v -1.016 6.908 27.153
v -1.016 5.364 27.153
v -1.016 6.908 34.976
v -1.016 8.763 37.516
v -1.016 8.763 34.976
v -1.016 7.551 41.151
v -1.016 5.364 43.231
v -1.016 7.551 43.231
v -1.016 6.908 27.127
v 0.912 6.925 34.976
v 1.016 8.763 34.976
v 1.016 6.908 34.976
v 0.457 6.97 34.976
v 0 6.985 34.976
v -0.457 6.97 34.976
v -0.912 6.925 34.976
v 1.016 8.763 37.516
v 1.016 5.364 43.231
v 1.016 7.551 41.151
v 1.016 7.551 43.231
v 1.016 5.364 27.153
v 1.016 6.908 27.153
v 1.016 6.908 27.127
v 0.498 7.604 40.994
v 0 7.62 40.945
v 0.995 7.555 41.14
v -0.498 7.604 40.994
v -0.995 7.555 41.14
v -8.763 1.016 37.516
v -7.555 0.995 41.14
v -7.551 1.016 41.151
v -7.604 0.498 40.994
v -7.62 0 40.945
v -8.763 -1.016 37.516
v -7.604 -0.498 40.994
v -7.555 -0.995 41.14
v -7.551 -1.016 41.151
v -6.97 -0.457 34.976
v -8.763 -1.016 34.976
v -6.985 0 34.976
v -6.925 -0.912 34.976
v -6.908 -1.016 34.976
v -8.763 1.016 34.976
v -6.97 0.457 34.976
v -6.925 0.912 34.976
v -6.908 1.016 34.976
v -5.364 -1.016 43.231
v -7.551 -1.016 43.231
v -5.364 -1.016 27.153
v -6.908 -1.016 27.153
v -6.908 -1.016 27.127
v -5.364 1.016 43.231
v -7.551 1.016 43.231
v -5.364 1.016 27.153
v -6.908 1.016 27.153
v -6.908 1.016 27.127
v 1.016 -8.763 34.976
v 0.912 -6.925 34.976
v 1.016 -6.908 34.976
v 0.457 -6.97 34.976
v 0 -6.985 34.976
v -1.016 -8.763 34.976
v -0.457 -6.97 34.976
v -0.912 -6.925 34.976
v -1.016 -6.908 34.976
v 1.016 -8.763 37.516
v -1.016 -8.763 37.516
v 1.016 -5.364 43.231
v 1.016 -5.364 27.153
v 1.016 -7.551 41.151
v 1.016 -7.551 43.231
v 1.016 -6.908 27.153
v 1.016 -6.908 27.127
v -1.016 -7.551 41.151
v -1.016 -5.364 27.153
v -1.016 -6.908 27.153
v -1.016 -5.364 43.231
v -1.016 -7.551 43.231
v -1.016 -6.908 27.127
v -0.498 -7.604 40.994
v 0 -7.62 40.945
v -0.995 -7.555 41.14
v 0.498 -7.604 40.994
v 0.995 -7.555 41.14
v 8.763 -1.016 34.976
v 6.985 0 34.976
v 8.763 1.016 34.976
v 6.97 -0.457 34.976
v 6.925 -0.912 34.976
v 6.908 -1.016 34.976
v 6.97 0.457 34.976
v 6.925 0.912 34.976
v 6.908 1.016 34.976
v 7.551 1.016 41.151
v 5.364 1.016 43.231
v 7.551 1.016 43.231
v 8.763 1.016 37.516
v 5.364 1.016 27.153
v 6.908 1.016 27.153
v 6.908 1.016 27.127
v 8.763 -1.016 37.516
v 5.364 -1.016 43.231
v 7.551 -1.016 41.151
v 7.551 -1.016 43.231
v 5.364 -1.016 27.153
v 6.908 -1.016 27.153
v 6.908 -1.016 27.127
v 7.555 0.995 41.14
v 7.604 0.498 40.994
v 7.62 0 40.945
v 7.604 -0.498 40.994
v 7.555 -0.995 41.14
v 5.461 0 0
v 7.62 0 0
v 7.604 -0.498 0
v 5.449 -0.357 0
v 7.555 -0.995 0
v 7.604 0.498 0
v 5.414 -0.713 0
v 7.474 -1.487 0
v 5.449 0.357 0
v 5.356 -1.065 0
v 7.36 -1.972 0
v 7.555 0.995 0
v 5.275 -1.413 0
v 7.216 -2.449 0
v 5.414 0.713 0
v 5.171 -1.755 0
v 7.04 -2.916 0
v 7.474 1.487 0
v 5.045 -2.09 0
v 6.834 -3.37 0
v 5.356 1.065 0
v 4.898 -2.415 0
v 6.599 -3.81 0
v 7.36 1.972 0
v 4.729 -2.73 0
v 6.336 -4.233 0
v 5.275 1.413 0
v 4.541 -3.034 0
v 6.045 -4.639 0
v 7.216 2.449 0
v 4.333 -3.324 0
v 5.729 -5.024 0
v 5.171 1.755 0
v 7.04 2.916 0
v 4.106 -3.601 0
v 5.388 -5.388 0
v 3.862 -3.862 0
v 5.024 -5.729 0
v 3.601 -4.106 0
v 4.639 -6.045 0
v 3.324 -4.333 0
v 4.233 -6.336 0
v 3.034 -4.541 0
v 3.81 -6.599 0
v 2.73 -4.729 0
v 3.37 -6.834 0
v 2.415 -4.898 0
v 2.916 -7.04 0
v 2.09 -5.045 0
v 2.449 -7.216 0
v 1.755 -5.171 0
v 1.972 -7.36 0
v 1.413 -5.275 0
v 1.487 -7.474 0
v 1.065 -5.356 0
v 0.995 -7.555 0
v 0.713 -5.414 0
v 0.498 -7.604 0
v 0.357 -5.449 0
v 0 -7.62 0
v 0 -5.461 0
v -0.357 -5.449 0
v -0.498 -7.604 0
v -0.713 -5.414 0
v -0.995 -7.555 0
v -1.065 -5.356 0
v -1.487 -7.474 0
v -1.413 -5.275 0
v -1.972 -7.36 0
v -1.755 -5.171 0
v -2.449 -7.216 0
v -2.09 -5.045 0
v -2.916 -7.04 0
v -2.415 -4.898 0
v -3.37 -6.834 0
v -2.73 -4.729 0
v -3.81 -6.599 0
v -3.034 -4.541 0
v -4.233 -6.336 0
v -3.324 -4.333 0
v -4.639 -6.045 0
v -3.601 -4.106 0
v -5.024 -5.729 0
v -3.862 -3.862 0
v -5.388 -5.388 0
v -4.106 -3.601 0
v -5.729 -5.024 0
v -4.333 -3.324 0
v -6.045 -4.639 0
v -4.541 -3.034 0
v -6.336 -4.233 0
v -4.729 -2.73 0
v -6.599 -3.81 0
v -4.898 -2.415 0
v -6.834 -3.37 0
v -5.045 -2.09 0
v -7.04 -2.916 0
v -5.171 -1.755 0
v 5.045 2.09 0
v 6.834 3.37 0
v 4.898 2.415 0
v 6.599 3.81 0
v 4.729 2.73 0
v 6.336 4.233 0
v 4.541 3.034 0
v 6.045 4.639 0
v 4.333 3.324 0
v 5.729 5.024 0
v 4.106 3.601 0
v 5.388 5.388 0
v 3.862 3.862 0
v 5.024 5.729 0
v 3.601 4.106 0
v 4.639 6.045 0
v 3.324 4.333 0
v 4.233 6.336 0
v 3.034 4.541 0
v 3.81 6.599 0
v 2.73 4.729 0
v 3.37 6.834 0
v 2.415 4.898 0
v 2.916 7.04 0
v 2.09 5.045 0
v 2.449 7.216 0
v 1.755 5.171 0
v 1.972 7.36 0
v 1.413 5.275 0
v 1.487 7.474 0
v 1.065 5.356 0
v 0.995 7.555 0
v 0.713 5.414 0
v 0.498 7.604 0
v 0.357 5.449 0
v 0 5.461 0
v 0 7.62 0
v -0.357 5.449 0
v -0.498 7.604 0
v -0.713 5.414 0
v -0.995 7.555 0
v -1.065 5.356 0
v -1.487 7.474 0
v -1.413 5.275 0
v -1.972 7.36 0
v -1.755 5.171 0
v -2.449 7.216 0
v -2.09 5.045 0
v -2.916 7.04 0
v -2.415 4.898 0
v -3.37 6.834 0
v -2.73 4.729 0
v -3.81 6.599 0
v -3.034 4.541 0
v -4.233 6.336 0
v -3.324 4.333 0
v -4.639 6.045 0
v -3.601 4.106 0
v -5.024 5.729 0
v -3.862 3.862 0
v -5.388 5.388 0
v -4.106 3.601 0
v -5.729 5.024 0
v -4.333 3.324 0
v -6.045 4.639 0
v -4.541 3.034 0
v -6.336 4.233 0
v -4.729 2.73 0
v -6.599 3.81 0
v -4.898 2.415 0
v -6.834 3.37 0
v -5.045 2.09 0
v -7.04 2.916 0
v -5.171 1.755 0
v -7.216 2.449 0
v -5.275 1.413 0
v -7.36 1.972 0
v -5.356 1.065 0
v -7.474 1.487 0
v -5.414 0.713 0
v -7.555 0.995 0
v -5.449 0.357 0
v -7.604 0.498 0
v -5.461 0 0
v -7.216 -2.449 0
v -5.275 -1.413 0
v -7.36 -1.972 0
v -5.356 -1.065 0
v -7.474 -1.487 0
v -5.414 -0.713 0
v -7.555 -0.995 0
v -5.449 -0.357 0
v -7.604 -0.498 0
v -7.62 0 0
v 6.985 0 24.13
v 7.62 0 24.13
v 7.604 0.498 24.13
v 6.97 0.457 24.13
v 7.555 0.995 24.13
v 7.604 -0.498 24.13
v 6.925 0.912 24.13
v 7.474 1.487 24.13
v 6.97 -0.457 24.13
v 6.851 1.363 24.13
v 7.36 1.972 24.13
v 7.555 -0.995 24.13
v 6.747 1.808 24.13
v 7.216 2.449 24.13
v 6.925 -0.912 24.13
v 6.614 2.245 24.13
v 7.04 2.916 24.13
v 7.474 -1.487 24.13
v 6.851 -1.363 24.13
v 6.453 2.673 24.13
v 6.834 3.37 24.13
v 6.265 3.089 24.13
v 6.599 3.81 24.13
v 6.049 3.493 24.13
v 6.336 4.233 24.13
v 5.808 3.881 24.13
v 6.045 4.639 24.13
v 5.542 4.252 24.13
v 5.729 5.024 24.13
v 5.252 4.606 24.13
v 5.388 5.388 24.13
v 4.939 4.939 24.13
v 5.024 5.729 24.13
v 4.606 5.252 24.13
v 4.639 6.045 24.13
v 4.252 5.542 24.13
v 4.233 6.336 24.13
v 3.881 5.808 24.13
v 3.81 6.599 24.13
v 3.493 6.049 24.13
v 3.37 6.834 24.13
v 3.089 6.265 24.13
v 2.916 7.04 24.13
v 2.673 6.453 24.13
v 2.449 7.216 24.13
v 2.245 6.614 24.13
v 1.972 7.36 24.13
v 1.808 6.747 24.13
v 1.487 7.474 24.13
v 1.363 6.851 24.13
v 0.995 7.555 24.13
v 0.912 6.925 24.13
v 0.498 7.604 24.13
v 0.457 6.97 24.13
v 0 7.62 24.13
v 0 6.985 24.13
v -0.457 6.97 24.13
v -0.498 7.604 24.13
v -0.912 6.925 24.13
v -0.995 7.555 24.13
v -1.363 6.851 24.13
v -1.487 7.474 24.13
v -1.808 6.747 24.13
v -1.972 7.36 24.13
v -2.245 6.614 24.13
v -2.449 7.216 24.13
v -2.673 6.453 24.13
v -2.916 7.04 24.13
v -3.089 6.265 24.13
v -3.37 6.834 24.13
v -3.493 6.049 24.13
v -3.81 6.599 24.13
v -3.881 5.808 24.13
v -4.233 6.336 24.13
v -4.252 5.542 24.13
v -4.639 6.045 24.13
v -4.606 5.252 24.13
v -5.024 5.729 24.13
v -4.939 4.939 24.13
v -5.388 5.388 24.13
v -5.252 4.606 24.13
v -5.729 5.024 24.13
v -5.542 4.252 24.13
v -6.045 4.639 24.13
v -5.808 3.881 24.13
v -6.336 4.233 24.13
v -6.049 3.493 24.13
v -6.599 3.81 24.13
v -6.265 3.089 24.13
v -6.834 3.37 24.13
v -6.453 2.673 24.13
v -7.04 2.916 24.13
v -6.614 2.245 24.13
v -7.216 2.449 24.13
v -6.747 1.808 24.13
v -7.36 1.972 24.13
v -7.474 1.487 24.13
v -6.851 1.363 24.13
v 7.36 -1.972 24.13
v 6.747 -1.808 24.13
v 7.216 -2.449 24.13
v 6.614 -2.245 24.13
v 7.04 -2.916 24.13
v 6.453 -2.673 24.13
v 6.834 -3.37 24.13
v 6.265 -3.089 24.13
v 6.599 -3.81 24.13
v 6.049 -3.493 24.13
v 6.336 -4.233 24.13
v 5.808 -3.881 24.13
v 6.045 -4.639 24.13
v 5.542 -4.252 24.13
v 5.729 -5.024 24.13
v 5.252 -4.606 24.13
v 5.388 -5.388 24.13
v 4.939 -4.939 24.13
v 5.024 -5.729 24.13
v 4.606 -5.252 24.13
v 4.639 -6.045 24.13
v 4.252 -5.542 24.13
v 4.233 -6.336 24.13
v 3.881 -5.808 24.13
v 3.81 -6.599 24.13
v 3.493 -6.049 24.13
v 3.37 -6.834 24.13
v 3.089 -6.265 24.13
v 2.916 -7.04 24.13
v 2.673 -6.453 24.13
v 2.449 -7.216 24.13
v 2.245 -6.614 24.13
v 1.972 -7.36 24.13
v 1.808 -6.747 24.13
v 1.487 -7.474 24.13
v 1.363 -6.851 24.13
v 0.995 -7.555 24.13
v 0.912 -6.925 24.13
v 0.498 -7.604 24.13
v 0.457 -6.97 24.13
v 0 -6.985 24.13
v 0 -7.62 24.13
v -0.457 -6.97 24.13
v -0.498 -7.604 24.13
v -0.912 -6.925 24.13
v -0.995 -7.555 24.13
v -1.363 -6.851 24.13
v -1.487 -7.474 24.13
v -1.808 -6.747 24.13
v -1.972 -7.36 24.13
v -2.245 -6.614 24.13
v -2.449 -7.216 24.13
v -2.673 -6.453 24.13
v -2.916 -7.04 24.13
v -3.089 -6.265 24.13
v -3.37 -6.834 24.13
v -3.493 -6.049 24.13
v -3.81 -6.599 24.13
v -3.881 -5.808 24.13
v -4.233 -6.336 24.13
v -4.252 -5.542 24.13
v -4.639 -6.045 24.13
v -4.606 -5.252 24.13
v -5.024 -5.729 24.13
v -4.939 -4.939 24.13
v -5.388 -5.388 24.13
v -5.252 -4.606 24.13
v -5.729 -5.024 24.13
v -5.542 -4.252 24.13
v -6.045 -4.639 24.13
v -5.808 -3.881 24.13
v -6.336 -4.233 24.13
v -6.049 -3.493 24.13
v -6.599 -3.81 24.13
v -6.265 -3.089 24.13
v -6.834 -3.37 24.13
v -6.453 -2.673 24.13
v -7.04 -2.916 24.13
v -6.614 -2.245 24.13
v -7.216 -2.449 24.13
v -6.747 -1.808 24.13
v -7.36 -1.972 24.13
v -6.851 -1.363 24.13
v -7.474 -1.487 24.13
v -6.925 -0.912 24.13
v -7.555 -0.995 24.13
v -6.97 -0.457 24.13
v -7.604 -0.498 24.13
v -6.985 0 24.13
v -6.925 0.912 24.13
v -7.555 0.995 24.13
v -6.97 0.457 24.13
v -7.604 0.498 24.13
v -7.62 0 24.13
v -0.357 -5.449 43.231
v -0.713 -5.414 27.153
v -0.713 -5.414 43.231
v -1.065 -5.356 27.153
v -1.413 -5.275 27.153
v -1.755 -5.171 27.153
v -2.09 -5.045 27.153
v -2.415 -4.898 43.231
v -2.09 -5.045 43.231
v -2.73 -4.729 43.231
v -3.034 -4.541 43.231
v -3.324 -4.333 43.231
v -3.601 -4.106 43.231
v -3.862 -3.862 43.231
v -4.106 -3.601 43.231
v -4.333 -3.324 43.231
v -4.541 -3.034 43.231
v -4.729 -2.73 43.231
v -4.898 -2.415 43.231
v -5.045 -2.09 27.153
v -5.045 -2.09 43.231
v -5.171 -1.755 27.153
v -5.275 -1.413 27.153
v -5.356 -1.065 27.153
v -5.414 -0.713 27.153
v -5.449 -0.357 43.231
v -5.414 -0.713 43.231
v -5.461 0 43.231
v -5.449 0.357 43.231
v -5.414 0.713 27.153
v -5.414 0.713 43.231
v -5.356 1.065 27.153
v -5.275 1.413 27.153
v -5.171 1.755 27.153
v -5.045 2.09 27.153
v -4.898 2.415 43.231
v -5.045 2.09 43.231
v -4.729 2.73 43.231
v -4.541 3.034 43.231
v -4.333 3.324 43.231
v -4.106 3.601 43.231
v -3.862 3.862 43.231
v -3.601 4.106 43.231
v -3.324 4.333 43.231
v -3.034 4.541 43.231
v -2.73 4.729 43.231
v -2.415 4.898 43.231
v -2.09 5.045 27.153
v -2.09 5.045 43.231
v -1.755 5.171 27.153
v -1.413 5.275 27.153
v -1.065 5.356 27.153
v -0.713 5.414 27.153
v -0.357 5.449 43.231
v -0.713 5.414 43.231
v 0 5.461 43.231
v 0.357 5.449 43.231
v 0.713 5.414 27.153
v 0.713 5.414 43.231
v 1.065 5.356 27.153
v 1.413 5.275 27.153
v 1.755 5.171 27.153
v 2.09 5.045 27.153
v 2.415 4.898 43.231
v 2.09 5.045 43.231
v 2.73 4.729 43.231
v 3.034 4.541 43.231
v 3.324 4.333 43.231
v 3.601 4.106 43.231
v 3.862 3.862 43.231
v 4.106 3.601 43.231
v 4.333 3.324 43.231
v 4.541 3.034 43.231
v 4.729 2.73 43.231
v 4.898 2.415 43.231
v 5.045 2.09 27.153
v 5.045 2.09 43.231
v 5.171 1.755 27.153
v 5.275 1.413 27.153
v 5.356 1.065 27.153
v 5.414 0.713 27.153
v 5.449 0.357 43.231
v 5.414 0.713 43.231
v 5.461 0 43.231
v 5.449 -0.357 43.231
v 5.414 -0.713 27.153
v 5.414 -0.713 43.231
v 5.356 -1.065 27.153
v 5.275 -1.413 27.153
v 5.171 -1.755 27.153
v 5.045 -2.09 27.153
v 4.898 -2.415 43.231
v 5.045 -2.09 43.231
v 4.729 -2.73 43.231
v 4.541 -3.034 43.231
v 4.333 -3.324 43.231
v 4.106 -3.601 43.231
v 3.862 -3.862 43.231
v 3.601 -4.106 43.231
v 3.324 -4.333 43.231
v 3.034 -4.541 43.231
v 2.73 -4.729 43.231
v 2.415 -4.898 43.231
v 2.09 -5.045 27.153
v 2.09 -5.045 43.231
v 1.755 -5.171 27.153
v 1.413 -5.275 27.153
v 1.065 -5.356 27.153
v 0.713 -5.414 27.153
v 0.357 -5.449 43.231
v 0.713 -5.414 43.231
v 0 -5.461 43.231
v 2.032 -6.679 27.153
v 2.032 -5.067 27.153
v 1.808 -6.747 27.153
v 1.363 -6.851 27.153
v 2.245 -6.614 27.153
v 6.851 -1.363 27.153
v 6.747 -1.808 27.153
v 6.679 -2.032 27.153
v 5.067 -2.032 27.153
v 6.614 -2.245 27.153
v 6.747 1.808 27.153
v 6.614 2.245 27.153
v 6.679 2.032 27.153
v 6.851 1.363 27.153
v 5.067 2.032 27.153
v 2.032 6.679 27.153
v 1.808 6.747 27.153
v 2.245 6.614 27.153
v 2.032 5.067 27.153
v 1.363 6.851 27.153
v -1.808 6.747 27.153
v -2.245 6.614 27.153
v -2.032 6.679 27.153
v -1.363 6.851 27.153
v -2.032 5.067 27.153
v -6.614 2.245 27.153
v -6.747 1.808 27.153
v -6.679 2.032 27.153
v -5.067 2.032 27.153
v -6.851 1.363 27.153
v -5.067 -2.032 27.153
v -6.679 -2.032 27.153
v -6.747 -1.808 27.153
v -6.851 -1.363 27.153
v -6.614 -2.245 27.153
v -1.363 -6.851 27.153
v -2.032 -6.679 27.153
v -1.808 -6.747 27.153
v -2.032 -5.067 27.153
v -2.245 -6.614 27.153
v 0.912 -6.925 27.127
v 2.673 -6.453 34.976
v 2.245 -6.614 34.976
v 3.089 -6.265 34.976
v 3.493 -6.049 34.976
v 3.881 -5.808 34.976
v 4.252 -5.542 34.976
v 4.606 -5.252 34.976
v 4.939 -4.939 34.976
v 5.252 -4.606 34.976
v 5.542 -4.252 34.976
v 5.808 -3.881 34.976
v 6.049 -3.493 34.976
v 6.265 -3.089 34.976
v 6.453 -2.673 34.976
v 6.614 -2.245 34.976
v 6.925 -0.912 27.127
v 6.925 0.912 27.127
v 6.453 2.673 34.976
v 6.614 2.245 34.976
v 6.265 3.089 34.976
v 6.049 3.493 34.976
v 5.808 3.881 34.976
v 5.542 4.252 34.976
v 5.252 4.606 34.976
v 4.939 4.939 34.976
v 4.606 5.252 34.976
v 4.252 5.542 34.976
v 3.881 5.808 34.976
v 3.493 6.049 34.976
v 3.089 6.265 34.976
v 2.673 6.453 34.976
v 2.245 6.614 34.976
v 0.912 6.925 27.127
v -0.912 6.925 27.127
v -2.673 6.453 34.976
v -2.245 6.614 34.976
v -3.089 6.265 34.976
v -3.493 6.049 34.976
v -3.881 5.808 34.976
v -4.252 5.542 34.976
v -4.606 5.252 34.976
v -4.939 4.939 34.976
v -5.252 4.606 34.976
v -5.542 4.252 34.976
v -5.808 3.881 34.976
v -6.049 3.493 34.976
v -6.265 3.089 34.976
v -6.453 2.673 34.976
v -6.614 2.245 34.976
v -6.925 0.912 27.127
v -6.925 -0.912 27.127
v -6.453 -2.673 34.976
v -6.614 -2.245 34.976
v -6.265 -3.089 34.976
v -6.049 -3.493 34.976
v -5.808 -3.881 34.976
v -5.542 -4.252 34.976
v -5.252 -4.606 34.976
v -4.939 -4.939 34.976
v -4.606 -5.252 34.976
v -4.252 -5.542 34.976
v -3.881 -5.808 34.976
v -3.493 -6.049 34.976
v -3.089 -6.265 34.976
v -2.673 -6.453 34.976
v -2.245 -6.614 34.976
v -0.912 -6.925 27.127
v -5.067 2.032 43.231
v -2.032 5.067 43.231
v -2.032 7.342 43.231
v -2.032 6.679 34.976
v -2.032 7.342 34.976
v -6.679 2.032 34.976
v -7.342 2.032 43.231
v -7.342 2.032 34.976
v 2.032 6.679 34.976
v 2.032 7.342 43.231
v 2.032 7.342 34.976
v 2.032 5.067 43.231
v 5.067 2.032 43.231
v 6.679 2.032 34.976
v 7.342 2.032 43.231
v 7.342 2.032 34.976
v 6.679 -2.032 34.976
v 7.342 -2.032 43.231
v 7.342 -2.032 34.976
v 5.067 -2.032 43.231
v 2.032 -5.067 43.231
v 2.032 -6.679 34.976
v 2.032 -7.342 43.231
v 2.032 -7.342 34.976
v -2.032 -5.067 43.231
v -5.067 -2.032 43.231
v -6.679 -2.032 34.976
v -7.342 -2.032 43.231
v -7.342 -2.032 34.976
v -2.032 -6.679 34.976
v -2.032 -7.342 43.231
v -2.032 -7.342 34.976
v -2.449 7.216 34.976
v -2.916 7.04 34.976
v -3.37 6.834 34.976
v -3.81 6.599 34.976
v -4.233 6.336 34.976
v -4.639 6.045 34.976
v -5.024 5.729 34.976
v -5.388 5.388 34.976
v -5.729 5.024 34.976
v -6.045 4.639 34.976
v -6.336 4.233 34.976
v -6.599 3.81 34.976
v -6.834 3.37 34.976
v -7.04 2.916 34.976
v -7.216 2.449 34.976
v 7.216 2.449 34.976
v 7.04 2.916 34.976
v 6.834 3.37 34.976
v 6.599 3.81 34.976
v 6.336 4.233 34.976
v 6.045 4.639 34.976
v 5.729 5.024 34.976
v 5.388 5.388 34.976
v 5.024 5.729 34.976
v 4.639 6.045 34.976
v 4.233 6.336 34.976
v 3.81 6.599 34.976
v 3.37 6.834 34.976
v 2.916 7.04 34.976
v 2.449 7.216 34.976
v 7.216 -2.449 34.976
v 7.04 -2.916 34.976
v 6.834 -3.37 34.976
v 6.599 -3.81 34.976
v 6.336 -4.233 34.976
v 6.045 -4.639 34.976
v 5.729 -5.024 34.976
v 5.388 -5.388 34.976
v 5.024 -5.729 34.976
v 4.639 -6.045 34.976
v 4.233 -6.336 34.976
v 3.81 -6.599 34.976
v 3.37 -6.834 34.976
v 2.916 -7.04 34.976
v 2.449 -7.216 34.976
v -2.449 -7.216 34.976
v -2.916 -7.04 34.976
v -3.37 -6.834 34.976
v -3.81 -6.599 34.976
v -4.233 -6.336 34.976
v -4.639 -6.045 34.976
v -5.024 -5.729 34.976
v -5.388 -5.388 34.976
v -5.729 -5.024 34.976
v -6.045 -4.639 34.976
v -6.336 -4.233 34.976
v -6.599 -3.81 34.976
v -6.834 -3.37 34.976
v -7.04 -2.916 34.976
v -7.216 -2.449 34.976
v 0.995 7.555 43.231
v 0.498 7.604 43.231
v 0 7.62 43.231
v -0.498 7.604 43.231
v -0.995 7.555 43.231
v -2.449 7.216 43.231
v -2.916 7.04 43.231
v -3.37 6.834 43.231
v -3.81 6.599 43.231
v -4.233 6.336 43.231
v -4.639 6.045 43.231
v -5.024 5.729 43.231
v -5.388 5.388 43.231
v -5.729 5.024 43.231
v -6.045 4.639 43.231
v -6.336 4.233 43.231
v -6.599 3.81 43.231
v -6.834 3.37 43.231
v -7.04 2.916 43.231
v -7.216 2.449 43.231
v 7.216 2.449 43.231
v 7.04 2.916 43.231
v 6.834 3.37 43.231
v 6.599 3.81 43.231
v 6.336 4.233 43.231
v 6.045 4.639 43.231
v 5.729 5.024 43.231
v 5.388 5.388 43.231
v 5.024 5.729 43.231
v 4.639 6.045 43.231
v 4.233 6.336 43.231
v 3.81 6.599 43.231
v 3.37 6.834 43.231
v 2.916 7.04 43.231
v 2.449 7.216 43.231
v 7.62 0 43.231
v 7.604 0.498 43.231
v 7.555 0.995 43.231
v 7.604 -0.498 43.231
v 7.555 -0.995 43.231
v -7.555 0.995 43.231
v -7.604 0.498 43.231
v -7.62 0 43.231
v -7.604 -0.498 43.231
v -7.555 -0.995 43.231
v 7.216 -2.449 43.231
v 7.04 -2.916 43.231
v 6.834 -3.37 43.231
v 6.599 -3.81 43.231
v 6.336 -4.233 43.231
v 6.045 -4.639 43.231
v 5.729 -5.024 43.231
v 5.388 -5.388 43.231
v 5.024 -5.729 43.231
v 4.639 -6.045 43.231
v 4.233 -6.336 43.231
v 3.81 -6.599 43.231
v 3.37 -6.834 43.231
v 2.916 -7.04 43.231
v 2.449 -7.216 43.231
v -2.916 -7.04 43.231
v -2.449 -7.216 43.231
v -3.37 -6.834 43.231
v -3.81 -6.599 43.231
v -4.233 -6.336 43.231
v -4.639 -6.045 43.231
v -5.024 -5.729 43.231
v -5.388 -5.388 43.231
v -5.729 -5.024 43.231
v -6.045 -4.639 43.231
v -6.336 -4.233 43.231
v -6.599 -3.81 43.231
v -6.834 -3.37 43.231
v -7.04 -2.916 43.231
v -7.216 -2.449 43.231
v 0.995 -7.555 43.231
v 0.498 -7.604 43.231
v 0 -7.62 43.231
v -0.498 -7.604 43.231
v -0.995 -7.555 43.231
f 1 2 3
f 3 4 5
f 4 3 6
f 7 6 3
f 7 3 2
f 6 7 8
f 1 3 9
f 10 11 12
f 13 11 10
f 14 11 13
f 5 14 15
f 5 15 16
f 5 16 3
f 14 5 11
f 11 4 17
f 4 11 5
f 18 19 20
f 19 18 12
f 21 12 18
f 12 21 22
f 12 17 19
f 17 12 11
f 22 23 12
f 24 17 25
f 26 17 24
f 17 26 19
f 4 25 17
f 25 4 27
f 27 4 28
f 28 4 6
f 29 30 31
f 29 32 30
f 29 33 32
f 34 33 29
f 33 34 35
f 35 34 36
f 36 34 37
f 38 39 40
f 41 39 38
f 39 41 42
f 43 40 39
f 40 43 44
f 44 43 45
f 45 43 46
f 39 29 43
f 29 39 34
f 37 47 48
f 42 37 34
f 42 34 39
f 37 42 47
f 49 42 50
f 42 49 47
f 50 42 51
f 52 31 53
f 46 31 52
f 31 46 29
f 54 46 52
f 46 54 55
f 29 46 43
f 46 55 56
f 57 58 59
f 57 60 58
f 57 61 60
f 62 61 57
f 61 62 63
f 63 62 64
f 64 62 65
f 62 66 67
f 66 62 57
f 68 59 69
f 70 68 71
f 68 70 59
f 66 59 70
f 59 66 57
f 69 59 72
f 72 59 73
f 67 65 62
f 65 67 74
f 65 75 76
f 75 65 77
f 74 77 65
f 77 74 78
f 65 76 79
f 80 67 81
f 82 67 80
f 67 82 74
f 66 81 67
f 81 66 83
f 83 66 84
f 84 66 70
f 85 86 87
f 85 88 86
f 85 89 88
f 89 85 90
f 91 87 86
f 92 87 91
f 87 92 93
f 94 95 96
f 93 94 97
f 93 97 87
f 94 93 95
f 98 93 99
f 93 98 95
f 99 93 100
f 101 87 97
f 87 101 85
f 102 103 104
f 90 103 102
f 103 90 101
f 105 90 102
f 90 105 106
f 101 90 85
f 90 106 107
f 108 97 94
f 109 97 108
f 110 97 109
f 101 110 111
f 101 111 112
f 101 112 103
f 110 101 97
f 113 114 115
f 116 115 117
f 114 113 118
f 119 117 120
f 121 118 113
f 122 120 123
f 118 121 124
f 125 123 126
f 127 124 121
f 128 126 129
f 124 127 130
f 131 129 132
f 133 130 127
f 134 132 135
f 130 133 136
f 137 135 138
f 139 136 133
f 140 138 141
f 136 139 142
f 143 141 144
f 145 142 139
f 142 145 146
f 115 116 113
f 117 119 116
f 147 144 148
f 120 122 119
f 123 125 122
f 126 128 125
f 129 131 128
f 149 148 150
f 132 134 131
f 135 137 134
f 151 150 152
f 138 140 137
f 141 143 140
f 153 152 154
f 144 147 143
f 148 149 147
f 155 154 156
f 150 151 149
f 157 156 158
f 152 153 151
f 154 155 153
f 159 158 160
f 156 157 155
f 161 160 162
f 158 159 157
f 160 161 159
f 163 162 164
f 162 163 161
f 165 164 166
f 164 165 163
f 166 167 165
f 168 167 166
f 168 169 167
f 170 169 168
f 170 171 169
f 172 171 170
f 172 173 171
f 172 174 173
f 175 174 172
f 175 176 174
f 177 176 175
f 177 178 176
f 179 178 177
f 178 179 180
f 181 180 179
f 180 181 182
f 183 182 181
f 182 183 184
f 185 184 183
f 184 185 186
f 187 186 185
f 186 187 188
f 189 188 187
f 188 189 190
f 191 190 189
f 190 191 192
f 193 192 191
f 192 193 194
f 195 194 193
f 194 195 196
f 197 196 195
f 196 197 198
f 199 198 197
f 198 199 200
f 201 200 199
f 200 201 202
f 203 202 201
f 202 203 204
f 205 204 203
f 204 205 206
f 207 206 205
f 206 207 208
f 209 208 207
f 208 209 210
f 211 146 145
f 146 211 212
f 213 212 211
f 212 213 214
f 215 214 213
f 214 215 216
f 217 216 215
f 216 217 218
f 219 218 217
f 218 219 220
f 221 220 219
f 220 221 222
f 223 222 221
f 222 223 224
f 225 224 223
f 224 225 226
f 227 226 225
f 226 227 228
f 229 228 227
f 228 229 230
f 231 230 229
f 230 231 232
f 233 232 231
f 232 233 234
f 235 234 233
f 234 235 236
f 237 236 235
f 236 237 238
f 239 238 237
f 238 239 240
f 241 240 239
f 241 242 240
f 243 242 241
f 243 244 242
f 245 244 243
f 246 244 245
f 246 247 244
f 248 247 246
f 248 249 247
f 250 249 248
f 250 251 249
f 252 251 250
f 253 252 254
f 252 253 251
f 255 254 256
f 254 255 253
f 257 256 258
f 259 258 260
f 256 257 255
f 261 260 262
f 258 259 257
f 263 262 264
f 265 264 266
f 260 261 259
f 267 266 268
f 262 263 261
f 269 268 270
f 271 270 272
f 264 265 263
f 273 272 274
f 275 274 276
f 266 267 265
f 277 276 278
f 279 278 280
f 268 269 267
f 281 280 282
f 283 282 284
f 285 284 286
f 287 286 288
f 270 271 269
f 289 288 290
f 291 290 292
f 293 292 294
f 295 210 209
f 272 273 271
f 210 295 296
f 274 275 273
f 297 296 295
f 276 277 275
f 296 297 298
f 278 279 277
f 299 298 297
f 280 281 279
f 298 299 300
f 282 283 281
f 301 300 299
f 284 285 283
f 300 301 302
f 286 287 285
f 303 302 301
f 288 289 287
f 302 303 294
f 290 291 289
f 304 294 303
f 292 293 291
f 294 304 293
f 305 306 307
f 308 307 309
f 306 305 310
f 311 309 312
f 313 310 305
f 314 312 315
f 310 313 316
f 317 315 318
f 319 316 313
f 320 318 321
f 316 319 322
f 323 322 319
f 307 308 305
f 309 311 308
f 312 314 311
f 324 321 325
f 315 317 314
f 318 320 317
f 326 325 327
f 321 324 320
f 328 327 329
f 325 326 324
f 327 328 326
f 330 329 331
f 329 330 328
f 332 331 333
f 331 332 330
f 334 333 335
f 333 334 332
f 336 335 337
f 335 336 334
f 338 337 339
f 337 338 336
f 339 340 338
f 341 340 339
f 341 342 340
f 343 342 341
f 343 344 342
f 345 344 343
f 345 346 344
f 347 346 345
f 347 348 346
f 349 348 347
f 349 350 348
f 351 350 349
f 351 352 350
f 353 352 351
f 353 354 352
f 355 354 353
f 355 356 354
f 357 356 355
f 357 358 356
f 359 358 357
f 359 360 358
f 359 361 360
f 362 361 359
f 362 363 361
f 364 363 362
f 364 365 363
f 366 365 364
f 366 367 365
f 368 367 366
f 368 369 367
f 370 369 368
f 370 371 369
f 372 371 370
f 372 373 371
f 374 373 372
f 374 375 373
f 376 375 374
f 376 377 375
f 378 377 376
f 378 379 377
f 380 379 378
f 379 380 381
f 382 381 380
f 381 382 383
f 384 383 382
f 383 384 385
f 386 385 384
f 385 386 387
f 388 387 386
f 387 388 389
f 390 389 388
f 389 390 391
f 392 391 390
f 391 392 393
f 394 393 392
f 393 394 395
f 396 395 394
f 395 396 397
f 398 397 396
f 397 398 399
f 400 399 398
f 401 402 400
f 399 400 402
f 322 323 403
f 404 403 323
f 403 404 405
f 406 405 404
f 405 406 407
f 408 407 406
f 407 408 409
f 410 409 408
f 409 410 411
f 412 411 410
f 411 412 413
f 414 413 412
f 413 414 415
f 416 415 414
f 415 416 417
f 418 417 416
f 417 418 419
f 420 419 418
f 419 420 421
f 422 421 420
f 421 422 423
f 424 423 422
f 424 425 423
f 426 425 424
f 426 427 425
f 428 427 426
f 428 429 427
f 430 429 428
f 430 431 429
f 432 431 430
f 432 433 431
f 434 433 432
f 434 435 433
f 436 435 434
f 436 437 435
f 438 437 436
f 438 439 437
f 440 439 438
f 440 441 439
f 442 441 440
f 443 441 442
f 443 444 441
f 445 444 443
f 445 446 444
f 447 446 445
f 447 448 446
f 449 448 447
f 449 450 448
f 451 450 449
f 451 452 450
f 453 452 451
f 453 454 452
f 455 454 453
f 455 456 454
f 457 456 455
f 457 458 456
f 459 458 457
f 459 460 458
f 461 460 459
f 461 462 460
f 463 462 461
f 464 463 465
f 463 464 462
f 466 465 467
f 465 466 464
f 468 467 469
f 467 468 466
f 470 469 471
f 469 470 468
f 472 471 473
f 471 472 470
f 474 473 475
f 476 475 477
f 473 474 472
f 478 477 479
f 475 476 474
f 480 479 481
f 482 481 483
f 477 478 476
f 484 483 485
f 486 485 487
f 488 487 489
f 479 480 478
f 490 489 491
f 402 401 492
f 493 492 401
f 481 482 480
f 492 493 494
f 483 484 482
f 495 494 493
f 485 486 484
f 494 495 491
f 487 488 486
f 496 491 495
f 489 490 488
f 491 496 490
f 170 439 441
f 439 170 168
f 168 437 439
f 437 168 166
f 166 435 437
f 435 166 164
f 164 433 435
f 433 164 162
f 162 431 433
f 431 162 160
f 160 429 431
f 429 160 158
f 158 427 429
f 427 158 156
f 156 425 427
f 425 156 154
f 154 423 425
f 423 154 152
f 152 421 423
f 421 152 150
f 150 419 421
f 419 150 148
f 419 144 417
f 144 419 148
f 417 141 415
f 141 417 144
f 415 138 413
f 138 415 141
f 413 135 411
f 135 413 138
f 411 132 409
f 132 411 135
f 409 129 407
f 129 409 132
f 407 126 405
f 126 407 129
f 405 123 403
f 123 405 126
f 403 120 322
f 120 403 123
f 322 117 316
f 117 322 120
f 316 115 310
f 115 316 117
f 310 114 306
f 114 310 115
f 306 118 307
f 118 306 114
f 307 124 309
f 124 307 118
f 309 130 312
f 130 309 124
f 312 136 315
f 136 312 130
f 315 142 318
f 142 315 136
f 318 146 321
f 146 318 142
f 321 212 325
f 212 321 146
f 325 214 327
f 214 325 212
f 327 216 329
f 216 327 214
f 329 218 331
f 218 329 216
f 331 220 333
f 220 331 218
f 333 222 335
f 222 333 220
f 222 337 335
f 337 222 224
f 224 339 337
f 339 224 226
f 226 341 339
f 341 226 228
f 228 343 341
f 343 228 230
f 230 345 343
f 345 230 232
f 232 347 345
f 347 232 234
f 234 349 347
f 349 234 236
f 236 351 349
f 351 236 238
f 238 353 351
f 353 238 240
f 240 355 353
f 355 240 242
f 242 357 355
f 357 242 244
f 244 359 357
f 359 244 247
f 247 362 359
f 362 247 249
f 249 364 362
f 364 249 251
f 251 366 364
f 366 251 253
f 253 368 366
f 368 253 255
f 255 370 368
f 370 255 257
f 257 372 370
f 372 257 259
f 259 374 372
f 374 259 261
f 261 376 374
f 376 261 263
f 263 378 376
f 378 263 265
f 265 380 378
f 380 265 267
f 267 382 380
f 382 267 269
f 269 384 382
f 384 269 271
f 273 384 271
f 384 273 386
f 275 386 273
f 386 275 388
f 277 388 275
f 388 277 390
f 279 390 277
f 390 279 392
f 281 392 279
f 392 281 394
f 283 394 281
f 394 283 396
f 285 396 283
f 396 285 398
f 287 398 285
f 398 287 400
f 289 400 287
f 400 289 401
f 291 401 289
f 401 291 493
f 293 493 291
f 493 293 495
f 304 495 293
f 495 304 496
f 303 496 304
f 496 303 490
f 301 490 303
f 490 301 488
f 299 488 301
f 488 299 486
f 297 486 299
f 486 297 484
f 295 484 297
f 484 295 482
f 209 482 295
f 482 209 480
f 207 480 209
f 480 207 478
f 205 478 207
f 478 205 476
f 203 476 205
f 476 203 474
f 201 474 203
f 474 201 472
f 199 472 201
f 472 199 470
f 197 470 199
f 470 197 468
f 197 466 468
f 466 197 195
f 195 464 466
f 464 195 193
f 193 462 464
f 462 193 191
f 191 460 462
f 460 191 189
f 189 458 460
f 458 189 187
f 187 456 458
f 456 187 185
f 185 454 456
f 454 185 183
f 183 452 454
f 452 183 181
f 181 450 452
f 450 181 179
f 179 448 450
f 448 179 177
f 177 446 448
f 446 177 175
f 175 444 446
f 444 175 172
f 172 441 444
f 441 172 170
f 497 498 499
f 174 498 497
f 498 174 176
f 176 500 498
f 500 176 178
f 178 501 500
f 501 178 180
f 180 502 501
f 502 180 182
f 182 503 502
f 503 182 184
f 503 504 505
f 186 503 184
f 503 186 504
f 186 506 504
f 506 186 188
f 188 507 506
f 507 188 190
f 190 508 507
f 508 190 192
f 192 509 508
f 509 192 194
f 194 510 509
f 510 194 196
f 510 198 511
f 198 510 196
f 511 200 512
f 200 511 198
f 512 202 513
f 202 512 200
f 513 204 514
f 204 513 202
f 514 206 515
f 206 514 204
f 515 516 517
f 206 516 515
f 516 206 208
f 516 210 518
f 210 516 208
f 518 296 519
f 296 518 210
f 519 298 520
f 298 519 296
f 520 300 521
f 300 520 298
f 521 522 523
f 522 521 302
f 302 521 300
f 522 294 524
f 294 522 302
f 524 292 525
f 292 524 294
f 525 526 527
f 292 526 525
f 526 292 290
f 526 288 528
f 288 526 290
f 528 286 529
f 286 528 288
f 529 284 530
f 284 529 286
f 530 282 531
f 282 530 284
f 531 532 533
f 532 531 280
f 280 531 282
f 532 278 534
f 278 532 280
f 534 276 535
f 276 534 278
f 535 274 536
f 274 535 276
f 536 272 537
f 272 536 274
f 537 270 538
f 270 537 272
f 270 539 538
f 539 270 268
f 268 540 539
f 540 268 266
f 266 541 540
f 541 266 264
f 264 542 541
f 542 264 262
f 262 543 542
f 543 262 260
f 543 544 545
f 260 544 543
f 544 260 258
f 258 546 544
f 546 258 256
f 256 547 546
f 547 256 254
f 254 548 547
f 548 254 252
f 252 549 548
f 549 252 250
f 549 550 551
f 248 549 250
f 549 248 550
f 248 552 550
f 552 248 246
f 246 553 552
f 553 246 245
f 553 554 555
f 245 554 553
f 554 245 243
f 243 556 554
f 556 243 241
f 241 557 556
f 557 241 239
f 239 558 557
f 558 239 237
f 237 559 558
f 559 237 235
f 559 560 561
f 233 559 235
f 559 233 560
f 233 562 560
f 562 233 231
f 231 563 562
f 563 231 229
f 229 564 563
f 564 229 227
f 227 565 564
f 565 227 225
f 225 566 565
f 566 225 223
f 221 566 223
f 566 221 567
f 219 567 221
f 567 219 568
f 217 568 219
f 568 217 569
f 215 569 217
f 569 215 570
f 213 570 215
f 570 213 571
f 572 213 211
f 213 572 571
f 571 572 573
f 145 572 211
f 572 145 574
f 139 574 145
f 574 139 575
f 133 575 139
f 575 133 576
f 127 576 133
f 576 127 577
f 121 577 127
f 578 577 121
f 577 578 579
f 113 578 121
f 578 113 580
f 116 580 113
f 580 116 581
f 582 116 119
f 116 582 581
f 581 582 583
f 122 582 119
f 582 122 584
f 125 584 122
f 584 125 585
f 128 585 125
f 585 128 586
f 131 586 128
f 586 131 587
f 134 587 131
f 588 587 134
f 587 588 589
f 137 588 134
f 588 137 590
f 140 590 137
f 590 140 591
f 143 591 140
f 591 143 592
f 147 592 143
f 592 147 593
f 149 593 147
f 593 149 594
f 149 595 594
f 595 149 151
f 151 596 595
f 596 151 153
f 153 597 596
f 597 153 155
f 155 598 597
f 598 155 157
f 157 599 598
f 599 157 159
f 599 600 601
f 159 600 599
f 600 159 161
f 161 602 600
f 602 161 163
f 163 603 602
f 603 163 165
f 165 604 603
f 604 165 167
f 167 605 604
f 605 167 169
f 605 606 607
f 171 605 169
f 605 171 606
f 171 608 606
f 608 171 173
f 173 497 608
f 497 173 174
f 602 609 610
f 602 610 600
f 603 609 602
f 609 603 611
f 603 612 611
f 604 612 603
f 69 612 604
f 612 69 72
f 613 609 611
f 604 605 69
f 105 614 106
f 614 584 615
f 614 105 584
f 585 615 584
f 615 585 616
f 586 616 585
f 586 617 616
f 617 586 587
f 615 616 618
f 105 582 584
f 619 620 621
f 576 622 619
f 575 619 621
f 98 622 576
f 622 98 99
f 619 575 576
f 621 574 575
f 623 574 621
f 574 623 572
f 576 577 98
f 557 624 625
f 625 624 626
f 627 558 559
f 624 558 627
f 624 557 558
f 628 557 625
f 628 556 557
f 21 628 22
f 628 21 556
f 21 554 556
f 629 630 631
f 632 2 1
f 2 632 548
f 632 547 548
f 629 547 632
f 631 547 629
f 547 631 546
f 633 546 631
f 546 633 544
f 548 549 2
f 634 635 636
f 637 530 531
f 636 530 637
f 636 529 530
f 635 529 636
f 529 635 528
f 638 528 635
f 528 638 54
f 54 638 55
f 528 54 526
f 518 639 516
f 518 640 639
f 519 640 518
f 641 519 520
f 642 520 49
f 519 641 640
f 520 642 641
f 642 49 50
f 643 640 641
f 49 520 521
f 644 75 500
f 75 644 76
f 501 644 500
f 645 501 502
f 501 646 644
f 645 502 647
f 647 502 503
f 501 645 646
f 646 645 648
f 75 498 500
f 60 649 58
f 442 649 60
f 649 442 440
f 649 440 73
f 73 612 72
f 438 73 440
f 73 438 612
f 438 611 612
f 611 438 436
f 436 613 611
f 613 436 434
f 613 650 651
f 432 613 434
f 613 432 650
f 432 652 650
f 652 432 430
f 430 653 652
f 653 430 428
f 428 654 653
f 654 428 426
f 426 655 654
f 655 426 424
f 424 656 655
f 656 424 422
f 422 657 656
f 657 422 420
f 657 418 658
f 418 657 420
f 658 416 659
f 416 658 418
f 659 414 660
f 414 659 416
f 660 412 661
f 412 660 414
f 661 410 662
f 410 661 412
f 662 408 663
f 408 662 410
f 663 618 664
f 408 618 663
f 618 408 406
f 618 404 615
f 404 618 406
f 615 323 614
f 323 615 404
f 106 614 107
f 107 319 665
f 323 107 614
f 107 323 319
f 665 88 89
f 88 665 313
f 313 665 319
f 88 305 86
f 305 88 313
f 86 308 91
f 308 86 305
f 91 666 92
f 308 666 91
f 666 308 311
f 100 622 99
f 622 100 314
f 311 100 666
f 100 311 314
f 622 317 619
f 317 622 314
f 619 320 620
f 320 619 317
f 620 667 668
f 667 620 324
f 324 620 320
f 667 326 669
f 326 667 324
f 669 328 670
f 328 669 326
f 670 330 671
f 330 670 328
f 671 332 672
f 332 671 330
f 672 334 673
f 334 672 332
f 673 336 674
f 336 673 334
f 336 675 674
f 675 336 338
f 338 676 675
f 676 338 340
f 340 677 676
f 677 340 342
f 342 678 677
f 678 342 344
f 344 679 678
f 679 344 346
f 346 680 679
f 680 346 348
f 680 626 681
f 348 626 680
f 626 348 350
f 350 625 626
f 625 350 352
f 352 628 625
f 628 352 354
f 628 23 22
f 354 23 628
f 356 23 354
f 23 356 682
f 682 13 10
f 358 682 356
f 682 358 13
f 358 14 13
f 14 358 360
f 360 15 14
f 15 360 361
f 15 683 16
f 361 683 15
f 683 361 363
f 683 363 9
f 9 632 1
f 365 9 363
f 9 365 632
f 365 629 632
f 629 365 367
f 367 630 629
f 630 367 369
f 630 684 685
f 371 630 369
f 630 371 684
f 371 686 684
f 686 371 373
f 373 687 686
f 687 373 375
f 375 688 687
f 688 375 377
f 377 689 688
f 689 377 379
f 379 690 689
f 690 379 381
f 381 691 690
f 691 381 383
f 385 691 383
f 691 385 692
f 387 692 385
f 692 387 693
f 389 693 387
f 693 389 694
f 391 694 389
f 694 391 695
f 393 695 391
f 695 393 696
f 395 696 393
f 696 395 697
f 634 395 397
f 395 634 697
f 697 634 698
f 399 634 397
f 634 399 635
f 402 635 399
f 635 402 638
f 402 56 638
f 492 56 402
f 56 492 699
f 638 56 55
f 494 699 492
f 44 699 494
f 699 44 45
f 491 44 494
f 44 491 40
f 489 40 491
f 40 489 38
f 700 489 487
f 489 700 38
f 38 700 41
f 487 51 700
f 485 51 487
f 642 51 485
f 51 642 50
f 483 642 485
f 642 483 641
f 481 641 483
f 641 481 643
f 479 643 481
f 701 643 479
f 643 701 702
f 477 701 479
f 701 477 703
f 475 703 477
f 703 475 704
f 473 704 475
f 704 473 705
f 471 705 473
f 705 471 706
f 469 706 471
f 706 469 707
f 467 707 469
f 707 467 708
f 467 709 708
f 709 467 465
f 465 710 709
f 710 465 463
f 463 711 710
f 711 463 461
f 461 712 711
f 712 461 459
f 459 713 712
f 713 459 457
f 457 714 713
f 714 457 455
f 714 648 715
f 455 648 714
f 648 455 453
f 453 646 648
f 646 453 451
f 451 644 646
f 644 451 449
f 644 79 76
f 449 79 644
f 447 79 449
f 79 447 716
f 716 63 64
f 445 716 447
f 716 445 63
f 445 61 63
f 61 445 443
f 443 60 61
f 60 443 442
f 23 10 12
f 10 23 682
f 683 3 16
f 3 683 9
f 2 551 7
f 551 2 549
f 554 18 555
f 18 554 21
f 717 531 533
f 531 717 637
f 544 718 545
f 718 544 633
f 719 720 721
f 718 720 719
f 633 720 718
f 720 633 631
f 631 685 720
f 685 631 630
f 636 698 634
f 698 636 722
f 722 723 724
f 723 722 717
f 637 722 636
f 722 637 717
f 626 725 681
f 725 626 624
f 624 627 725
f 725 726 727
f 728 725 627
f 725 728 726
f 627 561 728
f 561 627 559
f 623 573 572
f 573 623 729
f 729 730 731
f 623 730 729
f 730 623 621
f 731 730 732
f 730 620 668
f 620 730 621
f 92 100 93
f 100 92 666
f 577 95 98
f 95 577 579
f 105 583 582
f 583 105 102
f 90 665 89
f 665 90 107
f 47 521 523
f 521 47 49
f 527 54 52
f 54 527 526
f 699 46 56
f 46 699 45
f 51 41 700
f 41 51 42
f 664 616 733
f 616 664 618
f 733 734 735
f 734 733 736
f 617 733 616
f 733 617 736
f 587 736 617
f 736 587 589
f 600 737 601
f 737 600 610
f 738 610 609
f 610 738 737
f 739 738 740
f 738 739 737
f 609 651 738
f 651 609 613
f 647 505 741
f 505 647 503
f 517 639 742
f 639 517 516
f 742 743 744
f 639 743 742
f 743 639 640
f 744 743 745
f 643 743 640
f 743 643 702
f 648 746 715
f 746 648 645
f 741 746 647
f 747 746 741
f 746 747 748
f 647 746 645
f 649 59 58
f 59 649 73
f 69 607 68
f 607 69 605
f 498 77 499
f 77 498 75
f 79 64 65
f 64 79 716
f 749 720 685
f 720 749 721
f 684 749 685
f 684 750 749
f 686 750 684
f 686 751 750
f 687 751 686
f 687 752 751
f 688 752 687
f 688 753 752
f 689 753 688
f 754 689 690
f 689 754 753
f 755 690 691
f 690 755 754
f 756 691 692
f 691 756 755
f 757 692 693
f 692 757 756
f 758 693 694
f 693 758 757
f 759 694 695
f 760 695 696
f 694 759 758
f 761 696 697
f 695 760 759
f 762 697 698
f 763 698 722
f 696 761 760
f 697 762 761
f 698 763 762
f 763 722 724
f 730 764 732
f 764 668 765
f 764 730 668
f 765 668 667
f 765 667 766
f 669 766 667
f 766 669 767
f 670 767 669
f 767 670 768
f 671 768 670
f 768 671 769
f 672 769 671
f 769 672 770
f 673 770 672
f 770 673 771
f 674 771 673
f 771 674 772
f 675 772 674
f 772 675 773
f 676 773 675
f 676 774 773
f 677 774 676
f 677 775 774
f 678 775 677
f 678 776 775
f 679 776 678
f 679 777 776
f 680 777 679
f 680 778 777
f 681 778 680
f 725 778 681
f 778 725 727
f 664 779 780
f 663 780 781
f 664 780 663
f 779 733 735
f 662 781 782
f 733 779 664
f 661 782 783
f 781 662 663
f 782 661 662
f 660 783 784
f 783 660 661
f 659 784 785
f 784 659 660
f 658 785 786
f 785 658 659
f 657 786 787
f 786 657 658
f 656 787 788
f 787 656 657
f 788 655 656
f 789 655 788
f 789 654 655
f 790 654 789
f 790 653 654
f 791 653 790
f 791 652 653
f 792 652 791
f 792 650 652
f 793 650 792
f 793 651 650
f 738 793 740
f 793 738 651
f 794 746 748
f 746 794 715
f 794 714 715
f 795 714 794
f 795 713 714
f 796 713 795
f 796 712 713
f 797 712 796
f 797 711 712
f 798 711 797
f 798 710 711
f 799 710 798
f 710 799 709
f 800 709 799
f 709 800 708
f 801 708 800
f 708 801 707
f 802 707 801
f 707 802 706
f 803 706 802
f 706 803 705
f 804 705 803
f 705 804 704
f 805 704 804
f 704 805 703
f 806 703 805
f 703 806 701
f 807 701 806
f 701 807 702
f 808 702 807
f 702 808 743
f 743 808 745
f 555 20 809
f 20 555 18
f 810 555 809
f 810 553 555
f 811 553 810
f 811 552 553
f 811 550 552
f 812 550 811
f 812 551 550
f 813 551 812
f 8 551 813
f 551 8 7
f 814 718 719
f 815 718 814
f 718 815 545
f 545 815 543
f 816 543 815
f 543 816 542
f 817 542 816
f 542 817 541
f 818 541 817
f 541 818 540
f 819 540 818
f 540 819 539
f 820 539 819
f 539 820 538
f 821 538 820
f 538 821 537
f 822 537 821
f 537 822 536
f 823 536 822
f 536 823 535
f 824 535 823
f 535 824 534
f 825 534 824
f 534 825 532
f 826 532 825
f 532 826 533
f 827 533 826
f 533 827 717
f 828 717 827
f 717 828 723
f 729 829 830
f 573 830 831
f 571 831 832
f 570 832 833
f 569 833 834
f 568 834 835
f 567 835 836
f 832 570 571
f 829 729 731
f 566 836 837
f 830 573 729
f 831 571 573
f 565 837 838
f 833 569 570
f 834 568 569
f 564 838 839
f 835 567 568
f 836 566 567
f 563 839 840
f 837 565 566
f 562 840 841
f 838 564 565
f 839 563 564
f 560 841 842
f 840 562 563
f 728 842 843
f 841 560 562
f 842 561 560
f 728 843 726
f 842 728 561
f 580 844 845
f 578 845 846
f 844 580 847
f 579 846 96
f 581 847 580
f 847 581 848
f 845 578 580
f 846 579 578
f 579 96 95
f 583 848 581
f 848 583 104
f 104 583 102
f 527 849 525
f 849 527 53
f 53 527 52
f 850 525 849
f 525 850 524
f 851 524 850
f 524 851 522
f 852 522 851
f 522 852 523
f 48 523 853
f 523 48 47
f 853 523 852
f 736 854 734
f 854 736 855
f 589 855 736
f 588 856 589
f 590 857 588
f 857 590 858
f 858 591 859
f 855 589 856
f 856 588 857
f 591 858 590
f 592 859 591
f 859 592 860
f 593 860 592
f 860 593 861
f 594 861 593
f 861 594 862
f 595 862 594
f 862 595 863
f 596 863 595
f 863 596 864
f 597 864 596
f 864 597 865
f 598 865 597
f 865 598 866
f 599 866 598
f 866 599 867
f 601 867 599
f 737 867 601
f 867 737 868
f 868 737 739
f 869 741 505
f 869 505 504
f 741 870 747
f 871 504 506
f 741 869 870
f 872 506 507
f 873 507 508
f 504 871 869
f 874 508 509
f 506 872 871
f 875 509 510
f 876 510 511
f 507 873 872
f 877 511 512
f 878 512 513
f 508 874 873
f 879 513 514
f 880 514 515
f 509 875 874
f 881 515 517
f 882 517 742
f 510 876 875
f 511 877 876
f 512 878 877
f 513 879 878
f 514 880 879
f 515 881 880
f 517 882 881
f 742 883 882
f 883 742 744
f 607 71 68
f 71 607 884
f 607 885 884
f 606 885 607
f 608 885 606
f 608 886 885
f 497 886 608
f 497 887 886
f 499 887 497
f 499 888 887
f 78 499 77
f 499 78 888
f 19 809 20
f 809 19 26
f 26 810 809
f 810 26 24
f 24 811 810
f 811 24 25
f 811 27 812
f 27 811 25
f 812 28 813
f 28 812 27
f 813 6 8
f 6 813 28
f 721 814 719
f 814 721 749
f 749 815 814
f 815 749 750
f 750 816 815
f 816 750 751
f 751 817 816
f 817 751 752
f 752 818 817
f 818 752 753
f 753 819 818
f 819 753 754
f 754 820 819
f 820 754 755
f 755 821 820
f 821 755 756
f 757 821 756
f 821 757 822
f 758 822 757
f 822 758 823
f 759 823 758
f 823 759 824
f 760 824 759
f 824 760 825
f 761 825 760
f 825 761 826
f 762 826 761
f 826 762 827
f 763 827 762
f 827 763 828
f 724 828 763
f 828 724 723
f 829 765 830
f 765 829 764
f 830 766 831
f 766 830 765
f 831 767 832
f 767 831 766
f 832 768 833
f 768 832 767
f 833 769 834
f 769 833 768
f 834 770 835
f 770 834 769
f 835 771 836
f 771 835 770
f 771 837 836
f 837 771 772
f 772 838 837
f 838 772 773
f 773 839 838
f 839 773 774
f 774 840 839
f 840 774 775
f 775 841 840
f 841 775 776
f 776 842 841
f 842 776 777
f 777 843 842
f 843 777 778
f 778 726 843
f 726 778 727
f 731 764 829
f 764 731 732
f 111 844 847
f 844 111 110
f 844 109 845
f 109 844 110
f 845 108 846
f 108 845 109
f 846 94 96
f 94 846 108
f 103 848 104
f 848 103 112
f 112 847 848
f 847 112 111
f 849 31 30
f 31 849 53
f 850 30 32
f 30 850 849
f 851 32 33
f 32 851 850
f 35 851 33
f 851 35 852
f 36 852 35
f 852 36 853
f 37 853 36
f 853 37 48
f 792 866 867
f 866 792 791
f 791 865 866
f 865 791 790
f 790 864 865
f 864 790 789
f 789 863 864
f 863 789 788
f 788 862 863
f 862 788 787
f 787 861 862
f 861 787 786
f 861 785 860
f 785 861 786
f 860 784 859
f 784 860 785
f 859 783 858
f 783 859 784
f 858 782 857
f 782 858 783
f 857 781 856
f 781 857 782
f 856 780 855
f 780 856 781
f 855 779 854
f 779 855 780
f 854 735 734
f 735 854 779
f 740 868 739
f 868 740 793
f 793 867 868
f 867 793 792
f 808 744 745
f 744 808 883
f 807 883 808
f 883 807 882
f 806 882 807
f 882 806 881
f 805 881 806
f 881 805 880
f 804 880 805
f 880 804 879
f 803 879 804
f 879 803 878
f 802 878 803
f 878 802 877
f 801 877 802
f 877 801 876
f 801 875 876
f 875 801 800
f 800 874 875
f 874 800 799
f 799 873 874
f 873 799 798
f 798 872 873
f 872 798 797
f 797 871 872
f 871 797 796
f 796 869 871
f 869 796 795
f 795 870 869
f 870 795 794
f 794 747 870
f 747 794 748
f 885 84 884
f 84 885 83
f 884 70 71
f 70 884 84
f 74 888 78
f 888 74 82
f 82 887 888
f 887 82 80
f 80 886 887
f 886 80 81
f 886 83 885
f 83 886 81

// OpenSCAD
ViewScale = [0.0254, 0.0254, 0.0254];

module cutouts()
{
    translate([0, 60, 0])
    square([1000,40], center=true);
    translate([0, -60, 0])
    square([1000,40], center=true);

    translate([60, 0, 0])
    square([40,1000], center=true);
    translate([-60, 0, 0])
    square([40,1000], center=true);
}

module fins()
{
    for(ii=[0:90:360]) {
        rotate([0,0,ii])
        translate([40,295,0])
        rotate([0, -90, 0])
        linear_extrude(80)
        polygon(points=[[0,0],[250,0],[100,50],[0,50]]);
    }
}

scale(ViewScale)
{
    // base
    linear_extrude(950)
    difference() {
        circle(600/2, $fn=96);
        circle(430/2, $fn=96);
    }
    // thin bas
    translate([0, 0, 949])
    linear_extrude(120)
    difference() {
        circle(550/2, $fn=96);
        circle(430/2, $fn=96);
    }
    // thin cutout
    translate([0, 0, 1068])
    linear_extrude(310)
    difference() {
        circle(550/2, $fn=96);
        circle(430/2, $fn=96);
        cutouts();
    }
    // thick cutout
    translate([0, 0, 1377])
    linear_extrude(325)
    difference() {
        circle(600/2, $fn=96);
        circle(430/2, $fn=96);
        cutouts();
    }
    // fins
    translate([0, 0, 1377])
    fins();
}
